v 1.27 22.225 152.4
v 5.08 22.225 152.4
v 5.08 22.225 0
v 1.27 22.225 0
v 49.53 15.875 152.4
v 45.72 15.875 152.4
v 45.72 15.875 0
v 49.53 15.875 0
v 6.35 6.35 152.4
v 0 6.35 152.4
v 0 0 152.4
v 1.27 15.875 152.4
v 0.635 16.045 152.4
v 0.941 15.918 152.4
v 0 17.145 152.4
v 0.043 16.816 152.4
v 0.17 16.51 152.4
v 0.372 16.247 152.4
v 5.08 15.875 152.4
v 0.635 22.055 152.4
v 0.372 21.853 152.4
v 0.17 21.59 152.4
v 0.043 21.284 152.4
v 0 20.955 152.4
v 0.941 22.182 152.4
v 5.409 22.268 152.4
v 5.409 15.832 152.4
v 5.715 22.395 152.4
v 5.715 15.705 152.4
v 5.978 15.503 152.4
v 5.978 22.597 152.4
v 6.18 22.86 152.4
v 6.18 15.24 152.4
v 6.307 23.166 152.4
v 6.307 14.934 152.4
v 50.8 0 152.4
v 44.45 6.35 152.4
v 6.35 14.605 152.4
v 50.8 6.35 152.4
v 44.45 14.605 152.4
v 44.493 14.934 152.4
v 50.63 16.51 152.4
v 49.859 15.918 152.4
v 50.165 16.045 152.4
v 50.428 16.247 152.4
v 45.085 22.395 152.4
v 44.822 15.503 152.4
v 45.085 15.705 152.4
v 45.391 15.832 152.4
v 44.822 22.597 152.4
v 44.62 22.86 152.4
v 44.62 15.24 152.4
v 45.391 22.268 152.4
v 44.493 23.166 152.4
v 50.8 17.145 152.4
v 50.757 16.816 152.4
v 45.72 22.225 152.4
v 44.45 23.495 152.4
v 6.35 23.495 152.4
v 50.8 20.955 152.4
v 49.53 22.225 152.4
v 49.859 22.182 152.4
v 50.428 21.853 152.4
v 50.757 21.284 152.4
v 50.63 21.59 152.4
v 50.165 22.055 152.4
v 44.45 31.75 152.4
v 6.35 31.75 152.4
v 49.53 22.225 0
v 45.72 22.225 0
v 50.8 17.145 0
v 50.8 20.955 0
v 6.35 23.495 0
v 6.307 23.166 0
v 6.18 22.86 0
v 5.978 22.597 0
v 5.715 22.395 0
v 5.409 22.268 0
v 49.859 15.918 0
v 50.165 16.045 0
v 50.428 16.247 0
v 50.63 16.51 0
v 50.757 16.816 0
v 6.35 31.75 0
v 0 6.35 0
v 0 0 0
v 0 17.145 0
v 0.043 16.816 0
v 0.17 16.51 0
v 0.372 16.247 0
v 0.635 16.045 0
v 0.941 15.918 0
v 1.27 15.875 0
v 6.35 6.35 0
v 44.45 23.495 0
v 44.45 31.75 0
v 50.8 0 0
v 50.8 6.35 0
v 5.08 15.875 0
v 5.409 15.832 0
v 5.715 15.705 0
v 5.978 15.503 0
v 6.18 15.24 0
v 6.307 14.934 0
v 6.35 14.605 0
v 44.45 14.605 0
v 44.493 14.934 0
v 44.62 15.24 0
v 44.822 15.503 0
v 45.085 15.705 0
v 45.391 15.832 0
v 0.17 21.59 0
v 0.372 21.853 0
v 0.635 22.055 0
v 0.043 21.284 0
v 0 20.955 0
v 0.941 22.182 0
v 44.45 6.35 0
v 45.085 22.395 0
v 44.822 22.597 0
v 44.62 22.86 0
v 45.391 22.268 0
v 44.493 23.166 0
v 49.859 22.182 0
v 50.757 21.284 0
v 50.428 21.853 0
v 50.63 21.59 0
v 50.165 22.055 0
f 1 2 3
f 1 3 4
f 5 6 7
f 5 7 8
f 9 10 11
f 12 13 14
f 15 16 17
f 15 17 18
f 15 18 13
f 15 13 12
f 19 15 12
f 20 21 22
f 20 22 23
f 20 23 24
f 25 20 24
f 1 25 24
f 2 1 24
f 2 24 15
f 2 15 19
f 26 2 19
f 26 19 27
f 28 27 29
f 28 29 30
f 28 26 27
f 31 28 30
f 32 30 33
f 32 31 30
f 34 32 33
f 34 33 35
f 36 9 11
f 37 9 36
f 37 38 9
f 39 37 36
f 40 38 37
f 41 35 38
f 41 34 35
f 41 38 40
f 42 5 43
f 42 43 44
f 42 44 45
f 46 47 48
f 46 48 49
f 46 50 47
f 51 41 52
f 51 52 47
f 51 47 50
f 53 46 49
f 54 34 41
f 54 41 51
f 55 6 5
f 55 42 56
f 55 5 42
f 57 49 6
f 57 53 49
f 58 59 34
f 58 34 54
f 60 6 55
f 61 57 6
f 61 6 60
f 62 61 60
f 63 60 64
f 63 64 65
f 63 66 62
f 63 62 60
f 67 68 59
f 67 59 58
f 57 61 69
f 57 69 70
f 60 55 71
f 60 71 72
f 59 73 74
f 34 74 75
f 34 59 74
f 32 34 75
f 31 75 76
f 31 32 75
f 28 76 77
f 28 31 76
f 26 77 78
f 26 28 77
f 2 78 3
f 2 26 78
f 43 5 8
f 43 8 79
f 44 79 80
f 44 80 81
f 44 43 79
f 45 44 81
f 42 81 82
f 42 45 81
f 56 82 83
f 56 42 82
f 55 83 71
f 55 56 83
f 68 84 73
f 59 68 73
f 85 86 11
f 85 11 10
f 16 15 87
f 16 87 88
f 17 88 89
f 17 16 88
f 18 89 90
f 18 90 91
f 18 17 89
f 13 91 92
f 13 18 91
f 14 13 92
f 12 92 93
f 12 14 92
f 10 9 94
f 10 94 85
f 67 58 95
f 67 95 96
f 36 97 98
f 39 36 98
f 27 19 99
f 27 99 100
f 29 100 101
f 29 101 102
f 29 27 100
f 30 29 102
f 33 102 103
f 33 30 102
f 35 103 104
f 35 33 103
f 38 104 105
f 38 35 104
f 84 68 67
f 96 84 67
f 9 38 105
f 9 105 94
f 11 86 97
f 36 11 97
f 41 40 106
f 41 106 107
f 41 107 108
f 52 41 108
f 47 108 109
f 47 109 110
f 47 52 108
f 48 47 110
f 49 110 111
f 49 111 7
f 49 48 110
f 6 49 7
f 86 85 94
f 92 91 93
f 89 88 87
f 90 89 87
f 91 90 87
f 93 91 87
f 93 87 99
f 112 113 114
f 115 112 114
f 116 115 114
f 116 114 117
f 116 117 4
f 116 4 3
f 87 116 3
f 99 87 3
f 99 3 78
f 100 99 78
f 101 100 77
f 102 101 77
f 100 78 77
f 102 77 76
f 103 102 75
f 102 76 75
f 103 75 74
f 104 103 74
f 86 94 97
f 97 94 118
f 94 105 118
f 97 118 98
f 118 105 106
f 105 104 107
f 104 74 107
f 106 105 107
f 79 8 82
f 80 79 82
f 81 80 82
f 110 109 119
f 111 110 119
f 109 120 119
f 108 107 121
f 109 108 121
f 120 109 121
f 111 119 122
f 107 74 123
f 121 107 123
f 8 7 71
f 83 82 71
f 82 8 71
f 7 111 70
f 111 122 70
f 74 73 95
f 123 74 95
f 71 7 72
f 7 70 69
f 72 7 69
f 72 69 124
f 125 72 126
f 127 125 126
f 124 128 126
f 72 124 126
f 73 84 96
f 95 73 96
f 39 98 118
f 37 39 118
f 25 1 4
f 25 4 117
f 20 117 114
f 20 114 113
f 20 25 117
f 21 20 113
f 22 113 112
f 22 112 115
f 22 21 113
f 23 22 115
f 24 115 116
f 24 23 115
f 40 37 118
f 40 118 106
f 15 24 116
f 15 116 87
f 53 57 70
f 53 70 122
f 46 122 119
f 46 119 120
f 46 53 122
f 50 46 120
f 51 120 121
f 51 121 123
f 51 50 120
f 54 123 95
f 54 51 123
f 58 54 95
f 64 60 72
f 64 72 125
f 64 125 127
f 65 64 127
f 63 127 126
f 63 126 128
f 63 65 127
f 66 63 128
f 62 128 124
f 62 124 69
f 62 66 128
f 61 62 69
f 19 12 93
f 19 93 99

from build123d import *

# Parameters (mm, degrees)
SKETCH1_W          = 50.8
SKETCH1_H          = 31.75
BASE_EXTRUDE_DEPTH = 152.4
CUT_EXTRUDE1_DEPTH = 152.4


with BuildPart() as part:
    # Sketch1 → Base-Extrude (new body)
    with BuildSketch(Plane.XY):
        with Locations((25.4, 15.875)):
            Rectangle(SKETCH1_W, SKETCH1_H)
    extrude(amount=BASE_EXTRUDE_DEPTH)

    # Sketch2 → Cut-Extrude1 (cut)
    with BuildSketch(Plane.XY.offset(152.4)):
        with BuildLine():
            Line((50.8, 6.35), (44.45, 6.35))
            Line((44.45, 6.35), (44.45, 14.605))
            ThreePointArc((44.45, 14.605), (44.821974388, 15.503025612), (45.72, 15.875))
            Line((45.72, 15.875), (49.53, 15.875))
            ThreePointArc((49.53, 15.875), (50.428025612, 16.246974388), (50.8, 17.145))
            Line((50.8, 17.145), (50.8, 20.955))
            ThreePointArc((50.8, 20.955), (50.428025612, 21.853025612), (49.53, 22.225))
            Line((49.53, 22.225), (45.72, 22.225))
            ThreePointArc((45.72, 22.225), (44.821974388, 22.596974388), (44.45, 23.495))
            Line((44.45, 23.495), (44.45, 36.83))
            Line((44.45, 36.83), (54.61, 36.83))
            Line((54.61, 36.83), (54.61, 6.35))
            Line((54.61, 6.35), (50.8, 6.35))
        make_face()
        with BuildLine():
            Line((6.35, 38.1), (6.35, 23.495))
            ThreePointArc((6.35, 23.495), (5.978025612, 22.596974388), (5.08, 22.225))
            Line((5.08, 22.225), (1.27, 22.225))
            ThreePointArc((1.27, 22.225), (0.371974388, 21.853025612), (0, 20.955))
            Line((0, 20.955), (0, 17.145))
            ThreePointArc((0, 17.145), (0.371974388, 16.246974388), (1.27, 15.875))
            Line((1.27, 15.875), (5.08, 15.875))
            ThreePointArc((5.08, 15.875), (5.978025612, 15.503025612), (6.35, 14.605))
            Line((6.35, 14.605), (6.35, 6.35))
            Line((6.35, 6.35), (0, 6.35))
            Line((0, 6.35), (-3.81, 6.35))
            Line((-3.81, 6.35), (-3.81, 38.1))
            Line((-3.81, 38.1), (6.35, 38.1))
        make_face()
    extrude(amount=-CUT_EXTRUDE1_DEPTH, mode=Mode.SUBTRACT)


solid = part.part
